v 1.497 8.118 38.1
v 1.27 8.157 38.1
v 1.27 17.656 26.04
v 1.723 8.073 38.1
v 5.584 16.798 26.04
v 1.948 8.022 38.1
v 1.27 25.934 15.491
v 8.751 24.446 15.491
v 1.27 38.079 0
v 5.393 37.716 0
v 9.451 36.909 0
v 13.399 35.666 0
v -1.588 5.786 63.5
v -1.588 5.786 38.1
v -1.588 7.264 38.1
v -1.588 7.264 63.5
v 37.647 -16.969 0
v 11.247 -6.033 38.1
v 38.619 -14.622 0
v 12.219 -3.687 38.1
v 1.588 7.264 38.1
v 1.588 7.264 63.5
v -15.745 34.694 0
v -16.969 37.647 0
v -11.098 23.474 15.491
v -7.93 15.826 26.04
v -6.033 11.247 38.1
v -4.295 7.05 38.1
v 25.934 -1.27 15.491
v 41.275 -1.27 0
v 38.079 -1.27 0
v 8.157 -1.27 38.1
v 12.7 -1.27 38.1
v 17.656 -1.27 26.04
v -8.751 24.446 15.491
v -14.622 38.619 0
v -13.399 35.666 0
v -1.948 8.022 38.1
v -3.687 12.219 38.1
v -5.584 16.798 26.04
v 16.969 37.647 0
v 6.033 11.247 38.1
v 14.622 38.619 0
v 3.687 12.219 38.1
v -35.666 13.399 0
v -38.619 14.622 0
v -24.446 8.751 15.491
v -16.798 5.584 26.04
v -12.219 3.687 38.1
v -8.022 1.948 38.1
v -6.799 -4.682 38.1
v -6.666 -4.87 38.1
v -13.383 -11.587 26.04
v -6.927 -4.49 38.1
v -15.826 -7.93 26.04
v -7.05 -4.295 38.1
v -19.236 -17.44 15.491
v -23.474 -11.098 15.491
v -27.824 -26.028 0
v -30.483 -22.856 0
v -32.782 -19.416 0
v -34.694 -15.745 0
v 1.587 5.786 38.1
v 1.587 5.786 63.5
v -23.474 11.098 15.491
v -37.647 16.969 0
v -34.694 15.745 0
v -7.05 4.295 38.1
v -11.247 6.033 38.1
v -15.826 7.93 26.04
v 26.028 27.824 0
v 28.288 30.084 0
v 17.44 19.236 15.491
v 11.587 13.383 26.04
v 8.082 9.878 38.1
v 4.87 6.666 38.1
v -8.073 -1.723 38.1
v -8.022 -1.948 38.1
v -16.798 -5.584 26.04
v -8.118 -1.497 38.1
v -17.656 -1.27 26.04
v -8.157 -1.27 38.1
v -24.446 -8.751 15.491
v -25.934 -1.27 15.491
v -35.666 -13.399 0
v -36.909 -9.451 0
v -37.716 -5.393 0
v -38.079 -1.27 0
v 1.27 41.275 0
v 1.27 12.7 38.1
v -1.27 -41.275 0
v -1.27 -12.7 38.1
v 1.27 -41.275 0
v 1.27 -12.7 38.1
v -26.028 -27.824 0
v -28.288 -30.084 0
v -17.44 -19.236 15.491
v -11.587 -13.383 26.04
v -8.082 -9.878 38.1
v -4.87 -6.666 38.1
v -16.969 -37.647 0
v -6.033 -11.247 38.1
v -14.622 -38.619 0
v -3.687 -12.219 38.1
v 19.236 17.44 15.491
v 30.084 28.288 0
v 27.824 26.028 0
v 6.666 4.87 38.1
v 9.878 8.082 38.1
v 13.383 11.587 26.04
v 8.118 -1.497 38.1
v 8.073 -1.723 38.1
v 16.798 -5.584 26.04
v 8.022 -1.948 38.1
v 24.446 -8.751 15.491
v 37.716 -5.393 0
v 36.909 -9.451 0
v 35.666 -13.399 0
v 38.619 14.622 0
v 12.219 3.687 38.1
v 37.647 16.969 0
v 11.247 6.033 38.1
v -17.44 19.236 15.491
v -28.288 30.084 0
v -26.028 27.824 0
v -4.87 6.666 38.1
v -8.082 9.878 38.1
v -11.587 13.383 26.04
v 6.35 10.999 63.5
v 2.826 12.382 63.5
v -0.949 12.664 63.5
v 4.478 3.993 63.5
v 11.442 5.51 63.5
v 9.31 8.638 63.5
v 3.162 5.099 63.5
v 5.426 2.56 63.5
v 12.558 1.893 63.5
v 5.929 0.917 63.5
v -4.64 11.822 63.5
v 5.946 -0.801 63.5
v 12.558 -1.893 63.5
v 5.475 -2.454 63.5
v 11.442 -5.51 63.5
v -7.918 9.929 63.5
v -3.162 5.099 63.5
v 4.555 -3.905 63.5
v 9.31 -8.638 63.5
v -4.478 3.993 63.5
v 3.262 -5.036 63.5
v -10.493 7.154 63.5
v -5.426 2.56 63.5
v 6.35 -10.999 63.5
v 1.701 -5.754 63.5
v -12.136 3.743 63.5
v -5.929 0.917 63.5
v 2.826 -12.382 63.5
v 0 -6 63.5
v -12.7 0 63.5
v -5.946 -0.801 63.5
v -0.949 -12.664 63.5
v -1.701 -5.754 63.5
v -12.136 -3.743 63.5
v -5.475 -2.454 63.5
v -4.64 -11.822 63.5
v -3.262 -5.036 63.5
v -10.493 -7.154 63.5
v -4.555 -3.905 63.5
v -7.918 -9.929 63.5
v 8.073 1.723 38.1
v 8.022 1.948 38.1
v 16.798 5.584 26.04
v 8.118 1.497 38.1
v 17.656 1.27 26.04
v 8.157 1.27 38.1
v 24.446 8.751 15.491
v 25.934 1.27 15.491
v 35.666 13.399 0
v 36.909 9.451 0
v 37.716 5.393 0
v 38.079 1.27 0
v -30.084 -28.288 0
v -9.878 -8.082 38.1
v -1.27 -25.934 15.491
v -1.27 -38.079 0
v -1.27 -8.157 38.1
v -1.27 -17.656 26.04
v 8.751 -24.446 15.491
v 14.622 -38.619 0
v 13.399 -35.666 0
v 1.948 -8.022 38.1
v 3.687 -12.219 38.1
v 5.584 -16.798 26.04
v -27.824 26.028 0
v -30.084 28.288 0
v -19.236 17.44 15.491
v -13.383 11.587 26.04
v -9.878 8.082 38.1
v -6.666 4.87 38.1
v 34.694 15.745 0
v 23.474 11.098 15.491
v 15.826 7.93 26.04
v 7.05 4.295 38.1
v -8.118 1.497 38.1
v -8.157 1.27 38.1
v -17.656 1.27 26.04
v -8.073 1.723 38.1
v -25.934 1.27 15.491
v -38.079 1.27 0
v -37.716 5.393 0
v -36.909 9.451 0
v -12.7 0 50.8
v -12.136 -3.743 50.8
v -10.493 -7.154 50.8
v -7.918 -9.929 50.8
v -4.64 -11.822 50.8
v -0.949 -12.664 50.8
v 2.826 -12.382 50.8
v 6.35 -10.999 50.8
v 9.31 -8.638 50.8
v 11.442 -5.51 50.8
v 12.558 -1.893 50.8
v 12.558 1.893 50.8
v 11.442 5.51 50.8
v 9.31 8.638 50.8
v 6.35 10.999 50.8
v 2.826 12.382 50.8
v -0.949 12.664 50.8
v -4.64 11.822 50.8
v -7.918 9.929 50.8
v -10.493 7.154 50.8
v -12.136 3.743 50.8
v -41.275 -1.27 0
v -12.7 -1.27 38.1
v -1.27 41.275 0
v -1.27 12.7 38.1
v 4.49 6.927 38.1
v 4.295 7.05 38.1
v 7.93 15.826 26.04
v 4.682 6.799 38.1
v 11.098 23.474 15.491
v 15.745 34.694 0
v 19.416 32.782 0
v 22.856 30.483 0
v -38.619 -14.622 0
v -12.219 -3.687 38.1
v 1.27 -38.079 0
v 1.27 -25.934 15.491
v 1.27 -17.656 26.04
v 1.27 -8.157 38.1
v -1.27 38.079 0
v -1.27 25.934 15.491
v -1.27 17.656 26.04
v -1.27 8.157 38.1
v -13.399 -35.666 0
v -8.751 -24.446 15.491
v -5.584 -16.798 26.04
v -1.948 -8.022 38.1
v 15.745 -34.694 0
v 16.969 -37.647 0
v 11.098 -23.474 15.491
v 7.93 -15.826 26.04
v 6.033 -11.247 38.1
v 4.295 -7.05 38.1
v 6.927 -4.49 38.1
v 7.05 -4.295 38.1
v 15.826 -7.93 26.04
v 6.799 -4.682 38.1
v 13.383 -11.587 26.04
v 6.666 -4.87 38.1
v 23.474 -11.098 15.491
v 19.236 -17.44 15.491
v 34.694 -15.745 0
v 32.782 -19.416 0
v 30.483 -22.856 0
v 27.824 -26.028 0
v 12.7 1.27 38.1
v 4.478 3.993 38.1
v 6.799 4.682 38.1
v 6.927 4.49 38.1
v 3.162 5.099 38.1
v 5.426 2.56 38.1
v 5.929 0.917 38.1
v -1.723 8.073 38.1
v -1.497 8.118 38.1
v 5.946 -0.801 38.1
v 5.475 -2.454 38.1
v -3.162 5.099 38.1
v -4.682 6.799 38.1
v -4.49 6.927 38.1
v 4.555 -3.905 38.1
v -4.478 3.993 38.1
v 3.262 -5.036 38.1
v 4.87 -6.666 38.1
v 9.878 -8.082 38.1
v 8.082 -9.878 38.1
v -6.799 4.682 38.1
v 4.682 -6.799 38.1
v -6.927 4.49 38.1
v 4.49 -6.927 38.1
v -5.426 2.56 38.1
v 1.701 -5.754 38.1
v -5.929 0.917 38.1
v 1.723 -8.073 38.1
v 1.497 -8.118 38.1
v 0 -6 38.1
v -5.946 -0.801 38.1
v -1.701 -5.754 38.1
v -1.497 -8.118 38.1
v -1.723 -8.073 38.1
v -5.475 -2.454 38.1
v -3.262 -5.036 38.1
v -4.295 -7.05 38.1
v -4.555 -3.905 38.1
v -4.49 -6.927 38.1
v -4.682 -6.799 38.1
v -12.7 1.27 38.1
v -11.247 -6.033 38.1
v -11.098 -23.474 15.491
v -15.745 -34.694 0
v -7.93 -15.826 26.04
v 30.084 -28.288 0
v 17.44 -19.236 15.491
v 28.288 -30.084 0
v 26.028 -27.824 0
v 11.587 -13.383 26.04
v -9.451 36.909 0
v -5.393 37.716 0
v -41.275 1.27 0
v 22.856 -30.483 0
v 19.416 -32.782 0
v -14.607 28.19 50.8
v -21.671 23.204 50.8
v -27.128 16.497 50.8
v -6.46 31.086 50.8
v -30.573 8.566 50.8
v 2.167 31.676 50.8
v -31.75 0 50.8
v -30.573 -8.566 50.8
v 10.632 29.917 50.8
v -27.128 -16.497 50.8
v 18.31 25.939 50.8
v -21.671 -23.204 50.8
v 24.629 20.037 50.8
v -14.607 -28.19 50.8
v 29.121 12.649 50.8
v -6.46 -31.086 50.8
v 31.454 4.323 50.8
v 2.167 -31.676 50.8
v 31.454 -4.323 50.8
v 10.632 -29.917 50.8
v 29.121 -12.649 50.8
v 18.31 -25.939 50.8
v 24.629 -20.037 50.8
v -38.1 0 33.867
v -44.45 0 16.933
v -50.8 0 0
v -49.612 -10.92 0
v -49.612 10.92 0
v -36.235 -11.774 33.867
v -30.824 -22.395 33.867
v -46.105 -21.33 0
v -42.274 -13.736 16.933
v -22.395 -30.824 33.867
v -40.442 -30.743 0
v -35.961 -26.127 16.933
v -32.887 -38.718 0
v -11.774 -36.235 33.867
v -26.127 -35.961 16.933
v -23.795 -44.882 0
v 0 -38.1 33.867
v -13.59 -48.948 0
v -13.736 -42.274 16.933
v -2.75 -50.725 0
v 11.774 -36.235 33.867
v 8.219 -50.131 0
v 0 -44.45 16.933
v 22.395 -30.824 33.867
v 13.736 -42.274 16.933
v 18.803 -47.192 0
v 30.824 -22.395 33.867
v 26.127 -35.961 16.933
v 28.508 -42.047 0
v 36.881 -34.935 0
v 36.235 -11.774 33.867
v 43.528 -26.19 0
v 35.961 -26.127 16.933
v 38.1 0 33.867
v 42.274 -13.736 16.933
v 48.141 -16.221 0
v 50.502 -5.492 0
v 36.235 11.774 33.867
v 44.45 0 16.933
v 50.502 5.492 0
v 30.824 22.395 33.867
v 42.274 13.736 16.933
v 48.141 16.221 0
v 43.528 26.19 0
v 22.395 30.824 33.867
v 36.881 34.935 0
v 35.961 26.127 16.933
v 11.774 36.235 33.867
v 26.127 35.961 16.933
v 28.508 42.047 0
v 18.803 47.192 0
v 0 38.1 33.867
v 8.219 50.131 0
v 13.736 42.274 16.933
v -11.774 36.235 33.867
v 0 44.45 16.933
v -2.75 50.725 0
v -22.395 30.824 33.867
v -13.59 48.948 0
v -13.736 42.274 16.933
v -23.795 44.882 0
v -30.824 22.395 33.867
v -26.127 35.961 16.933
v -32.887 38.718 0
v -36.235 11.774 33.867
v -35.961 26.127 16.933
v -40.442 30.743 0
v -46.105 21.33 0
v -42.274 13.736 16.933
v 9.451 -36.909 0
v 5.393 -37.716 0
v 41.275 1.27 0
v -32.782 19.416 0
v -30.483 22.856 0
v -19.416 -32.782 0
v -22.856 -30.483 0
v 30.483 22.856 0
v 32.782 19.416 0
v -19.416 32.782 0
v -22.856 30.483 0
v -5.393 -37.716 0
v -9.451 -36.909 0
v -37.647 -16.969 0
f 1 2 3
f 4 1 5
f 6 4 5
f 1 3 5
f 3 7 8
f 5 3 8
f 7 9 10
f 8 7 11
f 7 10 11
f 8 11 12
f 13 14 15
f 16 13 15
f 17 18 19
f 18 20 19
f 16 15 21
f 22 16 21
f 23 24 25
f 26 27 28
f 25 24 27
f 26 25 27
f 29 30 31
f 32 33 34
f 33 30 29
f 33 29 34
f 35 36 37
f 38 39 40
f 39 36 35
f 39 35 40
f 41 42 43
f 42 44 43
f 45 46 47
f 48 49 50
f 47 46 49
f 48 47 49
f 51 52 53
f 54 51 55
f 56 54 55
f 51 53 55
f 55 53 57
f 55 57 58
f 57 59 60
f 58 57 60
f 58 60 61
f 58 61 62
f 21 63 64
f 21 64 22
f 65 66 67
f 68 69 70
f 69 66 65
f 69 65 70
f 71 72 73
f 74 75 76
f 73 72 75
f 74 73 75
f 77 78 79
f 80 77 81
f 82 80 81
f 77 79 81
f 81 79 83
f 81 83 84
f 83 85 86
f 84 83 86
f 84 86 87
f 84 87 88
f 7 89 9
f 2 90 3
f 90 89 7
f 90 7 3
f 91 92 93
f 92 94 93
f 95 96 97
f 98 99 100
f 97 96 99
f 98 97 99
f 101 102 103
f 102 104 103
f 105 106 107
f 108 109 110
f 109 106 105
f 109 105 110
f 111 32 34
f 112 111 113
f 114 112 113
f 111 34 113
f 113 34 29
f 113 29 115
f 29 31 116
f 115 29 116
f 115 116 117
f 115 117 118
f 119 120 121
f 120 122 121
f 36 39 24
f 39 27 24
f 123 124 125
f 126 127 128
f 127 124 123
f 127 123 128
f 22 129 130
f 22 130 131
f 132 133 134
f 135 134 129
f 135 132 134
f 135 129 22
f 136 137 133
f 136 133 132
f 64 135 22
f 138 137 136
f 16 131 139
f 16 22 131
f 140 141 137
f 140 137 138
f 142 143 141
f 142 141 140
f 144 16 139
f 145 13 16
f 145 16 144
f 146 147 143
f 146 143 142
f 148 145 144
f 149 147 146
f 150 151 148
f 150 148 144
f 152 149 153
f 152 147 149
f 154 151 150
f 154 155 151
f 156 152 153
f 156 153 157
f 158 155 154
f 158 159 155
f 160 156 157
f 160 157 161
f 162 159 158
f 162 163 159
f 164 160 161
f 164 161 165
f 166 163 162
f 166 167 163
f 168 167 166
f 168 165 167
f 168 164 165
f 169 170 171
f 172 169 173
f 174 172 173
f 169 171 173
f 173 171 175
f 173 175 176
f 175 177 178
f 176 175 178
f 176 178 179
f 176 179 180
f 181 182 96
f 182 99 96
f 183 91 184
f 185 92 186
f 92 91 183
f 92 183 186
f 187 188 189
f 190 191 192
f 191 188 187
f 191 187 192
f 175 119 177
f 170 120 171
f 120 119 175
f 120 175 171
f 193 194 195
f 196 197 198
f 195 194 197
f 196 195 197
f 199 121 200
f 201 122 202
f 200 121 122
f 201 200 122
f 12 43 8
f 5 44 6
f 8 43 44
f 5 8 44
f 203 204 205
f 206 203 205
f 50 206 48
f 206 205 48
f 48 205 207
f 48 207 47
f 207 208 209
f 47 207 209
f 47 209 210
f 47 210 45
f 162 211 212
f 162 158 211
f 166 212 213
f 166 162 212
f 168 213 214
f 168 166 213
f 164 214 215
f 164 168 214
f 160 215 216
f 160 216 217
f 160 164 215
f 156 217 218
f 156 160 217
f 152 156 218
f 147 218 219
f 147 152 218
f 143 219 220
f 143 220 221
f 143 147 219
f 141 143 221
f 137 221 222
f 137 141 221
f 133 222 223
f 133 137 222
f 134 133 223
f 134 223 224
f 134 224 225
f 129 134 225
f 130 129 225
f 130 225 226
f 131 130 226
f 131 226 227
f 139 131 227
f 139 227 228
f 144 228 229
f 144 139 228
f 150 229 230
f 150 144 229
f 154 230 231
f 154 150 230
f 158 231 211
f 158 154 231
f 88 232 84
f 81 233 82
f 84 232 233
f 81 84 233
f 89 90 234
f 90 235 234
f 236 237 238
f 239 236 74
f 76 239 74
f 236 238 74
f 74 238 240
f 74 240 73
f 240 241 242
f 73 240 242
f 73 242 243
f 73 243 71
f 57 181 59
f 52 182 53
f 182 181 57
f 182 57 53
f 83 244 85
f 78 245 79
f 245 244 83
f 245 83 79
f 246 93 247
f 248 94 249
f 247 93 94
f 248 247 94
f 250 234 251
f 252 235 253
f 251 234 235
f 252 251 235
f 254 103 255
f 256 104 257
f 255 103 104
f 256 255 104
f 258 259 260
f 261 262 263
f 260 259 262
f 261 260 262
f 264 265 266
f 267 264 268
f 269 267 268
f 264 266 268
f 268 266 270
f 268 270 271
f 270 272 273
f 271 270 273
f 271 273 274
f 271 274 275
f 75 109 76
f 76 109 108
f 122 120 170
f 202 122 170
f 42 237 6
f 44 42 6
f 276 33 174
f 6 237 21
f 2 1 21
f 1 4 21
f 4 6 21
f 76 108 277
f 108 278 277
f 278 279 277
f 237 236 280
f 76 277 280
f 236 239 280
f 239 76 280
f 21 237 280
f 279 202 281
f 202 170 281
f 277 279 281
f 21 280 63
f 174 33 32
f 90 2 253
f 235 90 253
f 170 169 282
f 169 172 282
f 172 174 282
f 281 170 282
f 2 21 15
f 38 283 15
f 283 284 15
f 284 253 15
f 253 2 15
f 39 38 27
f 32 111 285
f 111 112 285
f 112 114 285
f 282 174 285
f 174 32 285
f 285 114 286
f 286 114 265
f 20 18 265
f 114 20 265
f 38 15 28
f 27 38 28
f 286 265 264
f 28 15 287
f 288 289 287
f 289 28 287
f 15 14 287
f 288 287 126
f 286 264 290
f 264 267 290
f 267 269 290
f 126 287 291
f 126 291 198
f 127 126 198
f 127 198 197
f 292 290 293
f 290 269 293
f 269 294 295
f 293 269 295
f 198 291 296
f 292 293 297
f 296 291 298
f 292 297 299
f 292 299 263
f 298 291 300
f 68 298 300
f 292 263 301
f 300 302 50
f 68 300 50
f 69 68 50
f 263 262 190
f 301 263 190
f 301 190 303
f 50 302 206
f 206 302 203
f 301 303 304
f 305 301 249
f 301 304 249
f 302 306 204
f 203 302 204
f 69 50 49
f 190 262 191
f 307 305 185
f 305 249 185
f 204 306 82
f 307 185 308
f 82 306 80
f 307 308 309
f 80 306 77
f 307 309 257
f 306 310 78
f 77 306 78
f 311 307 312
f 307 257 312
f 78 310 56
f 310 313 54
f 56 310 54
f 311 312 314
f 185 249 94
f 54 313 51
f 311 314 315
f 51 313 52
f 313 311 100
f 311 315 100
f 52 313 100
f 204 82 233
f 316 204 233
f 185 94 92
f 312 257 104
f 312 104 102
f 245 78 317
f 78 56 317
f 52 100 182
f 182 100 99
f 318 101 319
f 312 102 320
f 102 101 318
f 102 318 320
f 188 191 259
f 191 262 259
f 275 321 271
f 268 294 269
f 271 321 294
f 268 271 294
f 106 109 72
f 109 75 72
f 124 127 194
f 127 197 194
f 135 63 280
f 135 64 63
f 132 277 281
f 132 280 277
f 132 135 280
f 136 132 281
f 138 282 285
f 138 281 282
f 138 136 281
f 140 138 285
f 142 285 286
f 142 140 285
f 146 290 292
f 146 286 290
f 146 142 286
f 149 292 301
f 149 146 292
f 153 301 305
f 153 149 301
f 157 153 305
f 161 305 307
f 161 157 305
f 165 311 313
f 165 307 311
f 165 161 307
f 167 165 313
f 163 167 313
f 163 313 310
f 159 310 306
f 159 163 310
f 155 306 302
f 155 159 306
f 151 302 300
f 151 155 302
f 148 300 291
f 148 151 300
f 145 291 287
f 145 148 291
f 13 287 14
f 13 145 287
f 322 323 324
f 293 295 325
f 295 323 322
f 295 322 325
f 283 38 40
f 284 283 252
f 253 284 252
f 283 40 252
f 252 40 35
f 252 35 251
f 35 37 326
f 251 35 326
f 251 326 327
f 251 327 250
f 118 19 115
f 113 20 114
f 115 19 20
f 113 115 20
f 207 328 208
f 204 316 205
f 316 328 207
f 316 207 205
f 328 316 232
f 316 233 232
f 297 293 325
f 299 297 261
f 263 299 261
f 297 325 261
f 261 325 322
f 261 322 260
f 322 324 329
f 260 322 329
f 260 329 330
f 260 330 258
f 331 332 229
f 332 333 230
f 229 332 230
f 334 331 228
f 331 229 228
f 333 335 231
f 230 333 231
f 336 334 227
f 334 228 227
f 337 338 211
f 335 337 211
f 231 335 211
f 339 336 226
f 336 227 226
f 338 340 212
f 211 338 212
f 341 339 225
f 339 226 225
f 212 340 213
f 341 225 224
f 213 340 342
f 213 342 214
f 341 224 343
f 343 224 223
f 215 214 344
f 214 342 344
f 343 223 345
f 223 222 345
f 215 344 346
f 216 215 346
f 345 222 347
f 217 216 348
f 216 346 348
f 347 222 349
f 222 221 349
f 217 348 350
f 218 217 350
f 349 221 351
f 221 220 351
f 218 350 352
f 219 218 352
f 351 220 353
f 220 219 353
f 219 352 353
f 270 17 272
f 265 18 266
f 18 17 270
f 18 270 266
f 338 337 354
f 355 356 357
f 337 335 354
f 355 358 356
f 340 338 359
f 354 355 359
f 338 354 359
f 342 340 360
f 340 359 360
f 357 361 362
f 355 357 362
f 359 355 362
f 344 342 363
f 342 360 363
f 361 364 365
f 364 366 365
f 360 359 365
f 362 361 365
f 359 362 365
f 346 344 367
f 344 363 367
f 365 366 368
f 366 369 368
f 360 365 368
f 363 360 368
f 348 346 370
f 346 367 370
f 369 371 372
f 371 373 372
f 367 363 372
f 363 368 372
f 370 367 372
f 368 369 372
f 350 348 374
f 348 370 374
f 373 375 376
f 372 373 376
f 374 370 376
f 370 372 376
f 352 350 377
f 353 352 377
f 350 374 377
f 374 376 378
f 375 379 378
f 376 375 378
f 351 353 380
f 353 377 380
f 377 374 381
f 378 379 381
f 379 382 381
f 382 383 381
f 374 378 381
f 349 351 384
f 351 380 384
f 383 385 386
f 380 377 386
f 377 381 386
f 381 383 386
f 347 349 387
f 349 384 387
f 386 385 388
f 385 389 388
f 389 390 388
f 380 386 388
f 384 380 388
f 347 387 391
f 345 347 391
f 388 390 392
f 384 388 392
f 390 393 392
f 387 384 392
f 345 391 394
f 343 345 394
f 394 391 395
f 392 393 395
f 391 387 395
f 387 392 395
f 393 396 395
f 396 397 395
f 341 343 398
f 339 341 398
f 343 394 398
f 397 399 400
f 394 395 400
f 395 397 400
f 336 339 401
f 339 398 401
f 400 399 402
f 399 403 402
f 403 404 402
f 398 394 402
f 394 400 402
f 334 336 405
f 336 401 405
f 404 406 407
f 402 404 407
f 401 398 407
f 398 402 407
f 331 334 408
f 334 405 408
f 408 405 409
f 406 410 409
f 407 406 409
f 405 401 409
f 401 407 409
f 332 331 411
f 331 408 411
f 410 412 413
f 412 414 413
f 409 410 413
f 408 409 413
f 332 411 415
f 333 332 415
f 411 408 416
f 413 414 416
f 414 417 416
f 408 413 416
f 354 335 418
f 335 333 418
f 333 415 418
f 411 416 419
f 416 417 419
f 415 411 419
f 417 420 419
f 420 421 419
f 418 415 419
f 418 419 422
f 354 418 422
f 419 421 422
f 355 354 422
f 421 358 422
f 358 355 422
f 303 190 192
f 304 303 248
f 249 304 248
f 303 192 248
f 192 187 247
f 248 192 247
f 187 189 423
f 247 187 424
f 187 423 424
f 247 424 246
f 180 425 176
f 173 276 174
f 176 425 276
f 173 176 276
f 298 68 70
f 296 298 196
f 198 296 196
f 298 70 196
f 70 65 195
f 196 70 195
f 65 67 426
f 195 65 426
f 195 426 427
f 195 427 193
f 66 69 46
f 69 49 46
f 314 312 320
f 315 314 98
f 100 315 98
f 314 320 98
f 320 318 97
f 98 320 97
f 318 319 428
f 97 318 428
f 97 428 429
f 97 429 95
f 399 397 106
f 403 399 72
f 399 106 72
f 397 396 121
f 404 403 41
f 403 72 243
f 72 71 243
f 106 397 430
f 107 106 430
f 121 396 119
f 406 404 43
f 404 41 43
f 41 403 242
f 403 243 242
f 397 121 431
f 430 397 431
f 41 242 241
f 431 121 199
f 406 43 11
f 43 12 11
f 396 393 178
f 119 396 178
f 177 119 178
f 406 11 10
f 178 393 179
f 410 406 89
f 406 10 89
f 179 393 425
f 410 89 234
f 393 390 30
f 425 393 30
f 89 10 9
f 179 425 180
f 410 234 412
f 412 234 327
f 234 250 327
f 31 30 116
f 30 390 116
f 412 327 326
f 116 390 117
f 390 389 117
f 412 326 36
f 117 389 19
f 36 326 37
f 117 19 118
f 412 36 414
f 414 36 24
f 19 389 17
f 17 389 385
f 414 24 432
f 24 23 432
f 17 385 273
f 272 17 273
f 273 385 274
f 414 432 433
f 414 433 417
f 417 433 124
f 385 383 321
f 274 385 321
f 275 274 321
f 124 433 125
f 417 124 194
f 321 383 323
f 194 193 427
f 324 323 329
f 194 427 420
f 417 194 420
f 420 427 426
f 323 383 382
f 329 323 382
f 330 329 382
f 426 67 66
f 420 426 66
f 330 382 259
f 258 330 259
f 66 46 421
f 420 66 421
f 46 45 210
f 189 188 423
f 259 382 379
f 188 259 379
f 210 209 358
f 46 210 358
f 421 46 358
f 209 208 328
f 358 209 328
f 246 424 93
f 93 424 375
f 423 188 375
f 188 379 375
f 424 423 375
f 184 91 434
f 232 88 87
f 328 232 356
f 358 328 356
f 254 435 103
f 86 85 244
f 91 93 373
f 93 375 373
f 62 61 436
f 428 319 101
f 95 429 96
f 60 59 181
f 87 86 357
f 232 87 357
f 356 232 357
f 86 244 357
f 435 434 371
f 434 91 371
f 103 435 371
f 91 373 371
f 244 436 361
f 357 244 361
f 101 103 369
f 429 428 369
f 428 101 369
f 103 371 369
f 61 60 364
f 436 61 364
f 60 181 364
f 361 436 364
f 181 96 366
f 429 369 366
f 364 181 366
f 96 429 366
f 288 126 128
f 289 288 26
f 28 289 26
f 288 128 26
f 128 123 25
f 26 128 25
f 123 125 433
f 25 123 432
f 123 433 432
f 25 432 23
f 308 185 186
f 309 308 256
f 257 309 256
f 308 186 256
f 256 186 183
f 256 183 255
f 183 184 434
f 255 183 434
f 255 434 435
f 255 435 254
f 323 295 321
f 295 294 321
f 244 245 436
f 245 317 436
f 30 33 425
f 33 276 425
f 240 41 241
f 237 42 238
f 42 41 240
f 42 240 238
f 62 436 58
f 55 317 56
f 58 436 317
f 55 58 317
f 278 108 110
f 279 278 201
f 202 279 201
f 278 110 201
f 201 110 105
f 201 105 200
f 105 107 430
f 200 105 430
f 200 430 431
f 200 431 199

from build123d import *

# Parameters (mm, degrees)
F0_W            = 12.7
F0_H            = 12.7
F2_W            = 6
F2_H            = 25.4
F4_W            = 3.175
F4_H            = 7.2644
F5_DEPTH        = 63.501
F7_DEPTH        = 1.27
F7_COPIES_COUNT = 16


# Not quite as in the source:
# - a pattern or mirror of a feature is missing from the dataset's text; its kind, count and spacing are read off the source's solid


with BuildPart() as f1:
    # F0 (on Front) → F1 (revolve)
    with BuildSketch(Plane.XZ):
        Polygon((-50.8, 0), (0, 0), (0, 50.8), (-12.7, 50.8), (-31.75, 50.8), align=None)
        with Locations((-6.35, 57.15)):
            Rectangle(F0_W, F0_H)
    revolve(axis=Axis((0, 0, 25.4), (0, 0, 1)))

    # F2 (on Front) → F3 (revolve, cut)
    with BuildSketch(Plane.XZ):
        Polygon((-8.255, 38.1), (-38.1, 0), (0, 0), (0, 38.1), (-6, 38.1), align=None)
        with Locations((-3, 50.8)):
            Rectangle(F2_W, F2_H)
    revolve(axis=Axis((0, 0, 19.05), (0, 0, -1)), mode=Mode.SUBTRACT)

    # F4 (on Top) → F5 (cut, through all)
    with BuildSketch(Plane.XY):
        with Locations((0, 3.6322)):
            Rectangle(F4_W, F4_H)
    extrude(amount=F5_DEPTH, mode=Mode.SUBTRACT)

    # F6 (on Front) → F7 (cut, symmetric)
    with BuildSketch(Plane.XZ):
        Polygon((-12.7, 38.1), (-41.275, 0), (-34.925, 0), (-6.35, 38.1), align=None)
    f7 = extrude(amount=F7_DEPTH, both=True, mode=Mode.SUBTRACT)

    # F7_copies: F7 ×16 about axis
    f7_copies_axis = Axis((0, 0, 0), (0, 0, 1))
    for i in range(1, F7_COPIES_COUNT):
        add(f7.rotate(f7_copies_axis, i * 360 / F7_COPIES_COUNT), mode=Mode.SUBTRACT)


solid = f1.part
